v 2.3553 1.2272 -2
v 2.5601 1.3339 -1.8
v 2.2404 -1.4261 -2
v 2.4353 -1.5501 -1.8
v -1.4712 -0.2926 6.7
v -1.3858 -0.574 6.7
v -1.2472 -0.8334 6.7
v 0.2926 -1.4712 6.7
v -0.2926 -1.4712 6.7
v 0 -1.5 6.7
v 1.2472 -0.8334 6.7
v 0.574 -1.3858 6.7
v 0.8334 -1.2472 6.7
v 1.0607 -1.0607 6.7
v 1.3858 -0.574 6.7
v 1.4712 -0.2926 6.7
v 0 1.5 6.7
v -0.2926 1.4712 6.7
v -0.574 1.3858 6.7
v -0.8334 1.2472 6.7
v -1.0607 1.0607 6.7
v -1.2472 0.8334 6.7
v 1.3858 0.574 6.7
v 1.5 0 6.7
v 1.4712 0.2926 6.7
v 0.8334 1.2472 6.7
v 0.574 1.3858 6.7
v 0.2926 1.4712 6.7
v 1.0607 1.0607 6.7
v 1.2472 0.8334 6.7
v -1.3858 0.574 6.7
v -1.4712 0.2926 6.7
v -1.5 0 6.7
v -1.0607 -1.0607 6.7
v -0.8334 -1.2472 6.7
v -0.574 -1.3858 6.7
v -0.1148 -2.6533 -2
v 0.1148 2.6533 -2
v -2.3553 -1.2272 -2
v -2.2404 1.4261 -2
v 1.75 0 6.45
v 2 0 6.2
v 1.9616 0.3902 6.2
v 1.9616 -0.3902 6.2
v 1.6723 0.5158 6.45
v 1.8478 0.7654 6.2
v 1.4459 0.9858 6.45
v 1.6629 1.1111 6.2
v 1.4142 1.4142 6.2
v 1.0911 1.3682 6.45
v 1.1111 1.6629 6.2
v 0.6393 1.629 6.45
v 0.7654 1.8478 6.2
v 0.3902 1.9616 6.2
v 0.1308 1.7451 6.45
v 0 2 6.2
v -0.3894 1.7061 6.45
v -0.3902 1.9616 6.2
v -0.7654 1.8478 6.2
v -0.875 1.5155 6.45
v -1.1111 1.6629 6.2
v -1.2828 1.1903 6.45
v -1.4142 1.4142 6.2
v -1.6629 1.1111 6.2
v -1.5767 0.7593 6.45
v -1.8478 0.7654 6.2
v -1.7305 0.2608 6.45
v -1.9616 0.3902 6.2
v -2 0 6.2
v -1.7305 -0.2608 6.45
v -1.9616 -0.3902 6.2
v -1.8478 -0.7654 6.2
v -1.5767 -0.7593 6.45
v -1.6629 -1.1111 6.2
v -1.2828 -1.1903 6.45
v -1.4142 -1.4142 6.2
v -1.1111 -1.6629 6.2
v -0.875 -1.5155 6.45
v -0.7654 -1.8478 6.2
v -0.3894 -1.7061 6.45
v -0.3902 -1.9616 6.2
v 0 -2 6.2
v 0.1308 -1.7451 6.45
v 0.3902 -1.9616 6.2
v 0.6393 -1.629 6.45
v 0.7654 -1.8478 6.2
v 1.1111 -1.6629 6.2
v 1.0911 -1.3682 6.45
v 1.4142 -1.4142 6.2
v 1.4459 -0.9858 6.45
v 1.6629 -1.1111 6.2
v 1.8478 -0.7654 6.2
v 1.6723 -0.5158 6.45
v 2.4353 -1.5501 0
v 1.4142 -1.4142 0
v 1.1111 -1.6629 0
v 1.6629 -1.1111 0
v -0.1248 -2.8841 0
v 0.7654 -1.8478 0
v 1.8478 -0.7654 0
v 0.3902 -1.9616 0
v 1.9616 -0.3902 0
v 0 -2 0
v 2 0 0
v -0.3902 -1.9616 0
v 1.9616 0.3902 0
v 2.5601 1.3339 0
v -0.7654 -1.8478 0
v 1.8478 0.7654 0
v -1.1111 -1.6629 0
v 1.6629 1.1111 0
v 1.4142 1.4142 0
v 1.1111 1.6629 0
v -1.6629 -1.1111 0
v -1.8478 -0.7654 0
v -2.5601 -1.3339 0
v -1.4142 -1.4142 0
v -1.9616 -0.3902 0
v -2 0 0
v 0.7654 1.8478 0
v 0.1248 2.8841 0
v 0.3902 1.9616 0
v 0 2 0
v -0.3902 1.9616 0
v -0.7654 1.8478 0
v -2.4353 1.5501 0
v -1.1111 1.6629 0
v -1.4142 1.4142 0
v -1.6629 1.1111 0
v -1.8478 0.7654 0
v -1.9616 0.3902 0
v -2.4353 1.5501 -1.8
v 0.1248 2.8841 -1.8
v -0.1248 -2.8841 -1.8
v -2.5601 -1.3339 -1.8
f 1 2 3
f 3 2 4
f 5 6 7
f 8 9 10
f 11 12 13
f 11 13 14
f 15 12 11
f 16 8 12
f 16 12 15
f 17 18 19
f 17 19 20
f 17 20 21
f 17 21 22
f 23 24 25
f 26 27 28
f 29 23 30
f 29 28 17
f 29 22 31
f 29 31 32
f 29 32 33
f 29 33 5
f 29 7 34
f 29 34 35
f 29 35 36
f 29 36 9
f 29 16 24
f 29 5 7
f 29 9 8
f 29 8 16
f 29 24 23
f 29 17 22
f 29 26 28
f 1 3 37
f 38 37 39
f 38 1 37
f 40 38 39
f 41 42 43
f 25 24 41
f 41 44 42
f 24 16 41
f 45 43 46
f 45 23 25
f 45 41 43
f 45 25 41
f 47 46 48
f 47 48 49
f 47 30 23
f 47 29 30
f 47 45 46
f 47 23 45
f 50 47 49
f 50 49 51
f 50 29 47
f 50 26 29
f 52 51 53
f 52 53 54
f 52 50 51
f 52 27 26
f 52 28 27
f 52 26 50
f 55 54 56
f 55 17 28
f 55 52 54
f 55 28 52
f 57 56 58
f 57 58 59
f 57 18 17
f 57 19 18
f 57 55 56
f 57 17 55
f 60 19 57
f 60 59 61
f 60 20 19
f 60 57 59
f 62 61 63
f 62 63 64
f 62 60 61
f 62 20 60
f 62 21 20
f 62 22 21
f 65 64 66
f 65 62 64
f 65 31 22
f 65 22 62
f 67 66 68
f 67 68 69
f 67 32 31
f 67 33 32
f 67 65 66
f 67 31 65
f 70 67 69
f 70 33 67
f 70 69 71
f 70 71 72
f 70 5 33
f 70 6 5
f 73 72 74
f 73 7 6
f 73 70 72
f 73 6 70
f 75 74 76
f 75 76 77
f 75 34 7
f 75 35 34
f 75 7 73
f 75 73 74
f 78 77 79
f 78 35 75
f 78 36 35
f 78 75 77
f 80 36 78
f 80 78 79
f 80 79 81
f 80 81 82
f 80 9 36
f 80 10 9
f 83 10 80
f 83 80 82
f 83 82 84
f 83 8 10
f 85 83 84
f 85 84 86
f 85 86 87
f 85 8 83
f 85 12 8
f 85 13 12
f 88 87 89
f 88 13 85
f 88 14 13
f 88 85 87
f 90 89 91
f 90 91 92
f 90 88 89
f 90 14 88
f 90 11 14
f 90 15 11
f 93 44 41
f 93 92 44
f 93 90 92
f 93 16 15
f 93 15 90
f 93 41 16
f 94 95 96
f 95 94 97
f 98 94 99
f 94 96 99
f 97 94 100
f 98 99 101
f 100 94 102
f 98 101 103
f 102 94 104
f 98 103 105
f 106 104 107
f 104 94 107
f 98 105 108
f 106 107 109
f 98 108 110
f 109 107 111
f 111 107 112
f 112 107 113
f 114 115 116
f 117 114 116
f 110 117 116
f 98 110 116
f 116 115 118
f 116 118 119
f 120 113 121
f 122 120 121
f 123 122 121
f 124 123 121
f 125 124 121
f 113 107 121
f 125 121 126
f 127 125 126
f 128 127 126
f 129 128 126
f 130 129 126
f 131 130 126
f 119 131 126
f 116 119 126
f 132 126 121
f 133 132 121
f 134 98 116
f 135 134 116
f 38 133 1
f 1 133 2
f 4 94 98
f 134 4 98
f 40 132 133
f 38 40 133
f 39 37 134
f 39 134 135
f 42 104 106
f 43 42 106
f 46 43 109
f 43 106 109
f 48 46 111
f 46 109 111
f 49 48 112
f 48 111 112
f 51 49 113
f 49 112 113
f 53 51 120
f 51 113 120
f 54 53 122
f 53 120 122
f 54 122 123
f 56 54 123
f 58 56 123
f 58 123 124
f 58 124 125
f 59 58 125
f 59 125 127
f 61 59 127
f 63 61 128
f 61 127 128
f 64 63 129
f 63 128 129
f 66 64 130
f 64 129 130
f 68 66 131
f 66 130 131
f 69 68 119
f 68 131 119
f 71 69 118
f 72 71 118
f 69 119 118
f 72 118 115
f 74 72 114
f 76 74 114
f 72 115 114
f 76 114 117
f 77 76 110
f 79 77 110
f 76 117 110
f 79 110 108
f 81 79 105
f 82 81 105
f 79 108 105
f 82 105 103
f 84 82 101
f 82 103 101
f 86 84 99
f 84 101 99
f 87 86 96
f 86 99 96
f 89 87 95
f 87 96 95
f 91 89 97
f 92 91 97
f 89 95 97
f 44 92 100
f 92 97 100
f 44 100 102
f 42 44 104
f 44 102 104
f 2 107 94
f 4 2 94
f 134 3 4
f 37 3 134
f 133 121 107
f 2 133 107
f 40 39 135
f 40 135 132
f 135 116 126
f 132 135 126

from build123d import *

# Parameters (mm, degrees)
SKETCH1_R           = 2
BOSS_EXTRUDE1_DEPTH = 6.7
CHAMFER1_SIZE       = 0.5
BOSS_EXTRUDE2_DEPTH = 2
CHAMFER2_SIZE       = 0.2


with BuildPart() as part:
    # Sketch1 → Boss-Extrude1 (new body)
    with BuildSketch(Plane.XY):
        Circle(SKETCH1_R)
    extrude(amount=BOSS_EXTRUDE1_DEPTH)

    # Chamfer1
    chamfer1_edges = [part.edges().sort_by_distance(p)[0] for p in [
        (-2, 0, 6.7),
    ]]
    chamfer(chamfer1_edges, length=CHAMFER1_SIZE)

    # Sketch2 → Boss-Extrude2 (add)
    with BuildSketch(Plane(origin=(0, 0, 0), x_dir=(-1, 0, 0), z_dir=(0, 0, -1))):
        Polygon((0.124813216, -2.884051836), (2.560068764, -1.333934502), (2.435255548, 1.550117334), (-0.124813216, 2.884051836), (-2.560068764, 1.333934502), (-2.435255548, -1.550117334), align=None)
    extrude(amount=BOSS_EXTRUDE2_DEPTH)

    # Chamfer2
    chamfer2_edges = [part.edges().sort_by_distance(p)[0] for p in [
        (1.155221166, -2.217084585, -2),
        (-1.34244099, -2.108993169, -2),
        (-2.497662156, 0.108091416, -2),
        (-1.155221166, 2.217084585, -2),
        (1.34244099, 2.108993169, -2),
        (2.497662156, -0.108091416, -2),
    ]]
    chamfer(chamfer2_edges, length=CHAMFER2_SIZE)


solid = part.part
